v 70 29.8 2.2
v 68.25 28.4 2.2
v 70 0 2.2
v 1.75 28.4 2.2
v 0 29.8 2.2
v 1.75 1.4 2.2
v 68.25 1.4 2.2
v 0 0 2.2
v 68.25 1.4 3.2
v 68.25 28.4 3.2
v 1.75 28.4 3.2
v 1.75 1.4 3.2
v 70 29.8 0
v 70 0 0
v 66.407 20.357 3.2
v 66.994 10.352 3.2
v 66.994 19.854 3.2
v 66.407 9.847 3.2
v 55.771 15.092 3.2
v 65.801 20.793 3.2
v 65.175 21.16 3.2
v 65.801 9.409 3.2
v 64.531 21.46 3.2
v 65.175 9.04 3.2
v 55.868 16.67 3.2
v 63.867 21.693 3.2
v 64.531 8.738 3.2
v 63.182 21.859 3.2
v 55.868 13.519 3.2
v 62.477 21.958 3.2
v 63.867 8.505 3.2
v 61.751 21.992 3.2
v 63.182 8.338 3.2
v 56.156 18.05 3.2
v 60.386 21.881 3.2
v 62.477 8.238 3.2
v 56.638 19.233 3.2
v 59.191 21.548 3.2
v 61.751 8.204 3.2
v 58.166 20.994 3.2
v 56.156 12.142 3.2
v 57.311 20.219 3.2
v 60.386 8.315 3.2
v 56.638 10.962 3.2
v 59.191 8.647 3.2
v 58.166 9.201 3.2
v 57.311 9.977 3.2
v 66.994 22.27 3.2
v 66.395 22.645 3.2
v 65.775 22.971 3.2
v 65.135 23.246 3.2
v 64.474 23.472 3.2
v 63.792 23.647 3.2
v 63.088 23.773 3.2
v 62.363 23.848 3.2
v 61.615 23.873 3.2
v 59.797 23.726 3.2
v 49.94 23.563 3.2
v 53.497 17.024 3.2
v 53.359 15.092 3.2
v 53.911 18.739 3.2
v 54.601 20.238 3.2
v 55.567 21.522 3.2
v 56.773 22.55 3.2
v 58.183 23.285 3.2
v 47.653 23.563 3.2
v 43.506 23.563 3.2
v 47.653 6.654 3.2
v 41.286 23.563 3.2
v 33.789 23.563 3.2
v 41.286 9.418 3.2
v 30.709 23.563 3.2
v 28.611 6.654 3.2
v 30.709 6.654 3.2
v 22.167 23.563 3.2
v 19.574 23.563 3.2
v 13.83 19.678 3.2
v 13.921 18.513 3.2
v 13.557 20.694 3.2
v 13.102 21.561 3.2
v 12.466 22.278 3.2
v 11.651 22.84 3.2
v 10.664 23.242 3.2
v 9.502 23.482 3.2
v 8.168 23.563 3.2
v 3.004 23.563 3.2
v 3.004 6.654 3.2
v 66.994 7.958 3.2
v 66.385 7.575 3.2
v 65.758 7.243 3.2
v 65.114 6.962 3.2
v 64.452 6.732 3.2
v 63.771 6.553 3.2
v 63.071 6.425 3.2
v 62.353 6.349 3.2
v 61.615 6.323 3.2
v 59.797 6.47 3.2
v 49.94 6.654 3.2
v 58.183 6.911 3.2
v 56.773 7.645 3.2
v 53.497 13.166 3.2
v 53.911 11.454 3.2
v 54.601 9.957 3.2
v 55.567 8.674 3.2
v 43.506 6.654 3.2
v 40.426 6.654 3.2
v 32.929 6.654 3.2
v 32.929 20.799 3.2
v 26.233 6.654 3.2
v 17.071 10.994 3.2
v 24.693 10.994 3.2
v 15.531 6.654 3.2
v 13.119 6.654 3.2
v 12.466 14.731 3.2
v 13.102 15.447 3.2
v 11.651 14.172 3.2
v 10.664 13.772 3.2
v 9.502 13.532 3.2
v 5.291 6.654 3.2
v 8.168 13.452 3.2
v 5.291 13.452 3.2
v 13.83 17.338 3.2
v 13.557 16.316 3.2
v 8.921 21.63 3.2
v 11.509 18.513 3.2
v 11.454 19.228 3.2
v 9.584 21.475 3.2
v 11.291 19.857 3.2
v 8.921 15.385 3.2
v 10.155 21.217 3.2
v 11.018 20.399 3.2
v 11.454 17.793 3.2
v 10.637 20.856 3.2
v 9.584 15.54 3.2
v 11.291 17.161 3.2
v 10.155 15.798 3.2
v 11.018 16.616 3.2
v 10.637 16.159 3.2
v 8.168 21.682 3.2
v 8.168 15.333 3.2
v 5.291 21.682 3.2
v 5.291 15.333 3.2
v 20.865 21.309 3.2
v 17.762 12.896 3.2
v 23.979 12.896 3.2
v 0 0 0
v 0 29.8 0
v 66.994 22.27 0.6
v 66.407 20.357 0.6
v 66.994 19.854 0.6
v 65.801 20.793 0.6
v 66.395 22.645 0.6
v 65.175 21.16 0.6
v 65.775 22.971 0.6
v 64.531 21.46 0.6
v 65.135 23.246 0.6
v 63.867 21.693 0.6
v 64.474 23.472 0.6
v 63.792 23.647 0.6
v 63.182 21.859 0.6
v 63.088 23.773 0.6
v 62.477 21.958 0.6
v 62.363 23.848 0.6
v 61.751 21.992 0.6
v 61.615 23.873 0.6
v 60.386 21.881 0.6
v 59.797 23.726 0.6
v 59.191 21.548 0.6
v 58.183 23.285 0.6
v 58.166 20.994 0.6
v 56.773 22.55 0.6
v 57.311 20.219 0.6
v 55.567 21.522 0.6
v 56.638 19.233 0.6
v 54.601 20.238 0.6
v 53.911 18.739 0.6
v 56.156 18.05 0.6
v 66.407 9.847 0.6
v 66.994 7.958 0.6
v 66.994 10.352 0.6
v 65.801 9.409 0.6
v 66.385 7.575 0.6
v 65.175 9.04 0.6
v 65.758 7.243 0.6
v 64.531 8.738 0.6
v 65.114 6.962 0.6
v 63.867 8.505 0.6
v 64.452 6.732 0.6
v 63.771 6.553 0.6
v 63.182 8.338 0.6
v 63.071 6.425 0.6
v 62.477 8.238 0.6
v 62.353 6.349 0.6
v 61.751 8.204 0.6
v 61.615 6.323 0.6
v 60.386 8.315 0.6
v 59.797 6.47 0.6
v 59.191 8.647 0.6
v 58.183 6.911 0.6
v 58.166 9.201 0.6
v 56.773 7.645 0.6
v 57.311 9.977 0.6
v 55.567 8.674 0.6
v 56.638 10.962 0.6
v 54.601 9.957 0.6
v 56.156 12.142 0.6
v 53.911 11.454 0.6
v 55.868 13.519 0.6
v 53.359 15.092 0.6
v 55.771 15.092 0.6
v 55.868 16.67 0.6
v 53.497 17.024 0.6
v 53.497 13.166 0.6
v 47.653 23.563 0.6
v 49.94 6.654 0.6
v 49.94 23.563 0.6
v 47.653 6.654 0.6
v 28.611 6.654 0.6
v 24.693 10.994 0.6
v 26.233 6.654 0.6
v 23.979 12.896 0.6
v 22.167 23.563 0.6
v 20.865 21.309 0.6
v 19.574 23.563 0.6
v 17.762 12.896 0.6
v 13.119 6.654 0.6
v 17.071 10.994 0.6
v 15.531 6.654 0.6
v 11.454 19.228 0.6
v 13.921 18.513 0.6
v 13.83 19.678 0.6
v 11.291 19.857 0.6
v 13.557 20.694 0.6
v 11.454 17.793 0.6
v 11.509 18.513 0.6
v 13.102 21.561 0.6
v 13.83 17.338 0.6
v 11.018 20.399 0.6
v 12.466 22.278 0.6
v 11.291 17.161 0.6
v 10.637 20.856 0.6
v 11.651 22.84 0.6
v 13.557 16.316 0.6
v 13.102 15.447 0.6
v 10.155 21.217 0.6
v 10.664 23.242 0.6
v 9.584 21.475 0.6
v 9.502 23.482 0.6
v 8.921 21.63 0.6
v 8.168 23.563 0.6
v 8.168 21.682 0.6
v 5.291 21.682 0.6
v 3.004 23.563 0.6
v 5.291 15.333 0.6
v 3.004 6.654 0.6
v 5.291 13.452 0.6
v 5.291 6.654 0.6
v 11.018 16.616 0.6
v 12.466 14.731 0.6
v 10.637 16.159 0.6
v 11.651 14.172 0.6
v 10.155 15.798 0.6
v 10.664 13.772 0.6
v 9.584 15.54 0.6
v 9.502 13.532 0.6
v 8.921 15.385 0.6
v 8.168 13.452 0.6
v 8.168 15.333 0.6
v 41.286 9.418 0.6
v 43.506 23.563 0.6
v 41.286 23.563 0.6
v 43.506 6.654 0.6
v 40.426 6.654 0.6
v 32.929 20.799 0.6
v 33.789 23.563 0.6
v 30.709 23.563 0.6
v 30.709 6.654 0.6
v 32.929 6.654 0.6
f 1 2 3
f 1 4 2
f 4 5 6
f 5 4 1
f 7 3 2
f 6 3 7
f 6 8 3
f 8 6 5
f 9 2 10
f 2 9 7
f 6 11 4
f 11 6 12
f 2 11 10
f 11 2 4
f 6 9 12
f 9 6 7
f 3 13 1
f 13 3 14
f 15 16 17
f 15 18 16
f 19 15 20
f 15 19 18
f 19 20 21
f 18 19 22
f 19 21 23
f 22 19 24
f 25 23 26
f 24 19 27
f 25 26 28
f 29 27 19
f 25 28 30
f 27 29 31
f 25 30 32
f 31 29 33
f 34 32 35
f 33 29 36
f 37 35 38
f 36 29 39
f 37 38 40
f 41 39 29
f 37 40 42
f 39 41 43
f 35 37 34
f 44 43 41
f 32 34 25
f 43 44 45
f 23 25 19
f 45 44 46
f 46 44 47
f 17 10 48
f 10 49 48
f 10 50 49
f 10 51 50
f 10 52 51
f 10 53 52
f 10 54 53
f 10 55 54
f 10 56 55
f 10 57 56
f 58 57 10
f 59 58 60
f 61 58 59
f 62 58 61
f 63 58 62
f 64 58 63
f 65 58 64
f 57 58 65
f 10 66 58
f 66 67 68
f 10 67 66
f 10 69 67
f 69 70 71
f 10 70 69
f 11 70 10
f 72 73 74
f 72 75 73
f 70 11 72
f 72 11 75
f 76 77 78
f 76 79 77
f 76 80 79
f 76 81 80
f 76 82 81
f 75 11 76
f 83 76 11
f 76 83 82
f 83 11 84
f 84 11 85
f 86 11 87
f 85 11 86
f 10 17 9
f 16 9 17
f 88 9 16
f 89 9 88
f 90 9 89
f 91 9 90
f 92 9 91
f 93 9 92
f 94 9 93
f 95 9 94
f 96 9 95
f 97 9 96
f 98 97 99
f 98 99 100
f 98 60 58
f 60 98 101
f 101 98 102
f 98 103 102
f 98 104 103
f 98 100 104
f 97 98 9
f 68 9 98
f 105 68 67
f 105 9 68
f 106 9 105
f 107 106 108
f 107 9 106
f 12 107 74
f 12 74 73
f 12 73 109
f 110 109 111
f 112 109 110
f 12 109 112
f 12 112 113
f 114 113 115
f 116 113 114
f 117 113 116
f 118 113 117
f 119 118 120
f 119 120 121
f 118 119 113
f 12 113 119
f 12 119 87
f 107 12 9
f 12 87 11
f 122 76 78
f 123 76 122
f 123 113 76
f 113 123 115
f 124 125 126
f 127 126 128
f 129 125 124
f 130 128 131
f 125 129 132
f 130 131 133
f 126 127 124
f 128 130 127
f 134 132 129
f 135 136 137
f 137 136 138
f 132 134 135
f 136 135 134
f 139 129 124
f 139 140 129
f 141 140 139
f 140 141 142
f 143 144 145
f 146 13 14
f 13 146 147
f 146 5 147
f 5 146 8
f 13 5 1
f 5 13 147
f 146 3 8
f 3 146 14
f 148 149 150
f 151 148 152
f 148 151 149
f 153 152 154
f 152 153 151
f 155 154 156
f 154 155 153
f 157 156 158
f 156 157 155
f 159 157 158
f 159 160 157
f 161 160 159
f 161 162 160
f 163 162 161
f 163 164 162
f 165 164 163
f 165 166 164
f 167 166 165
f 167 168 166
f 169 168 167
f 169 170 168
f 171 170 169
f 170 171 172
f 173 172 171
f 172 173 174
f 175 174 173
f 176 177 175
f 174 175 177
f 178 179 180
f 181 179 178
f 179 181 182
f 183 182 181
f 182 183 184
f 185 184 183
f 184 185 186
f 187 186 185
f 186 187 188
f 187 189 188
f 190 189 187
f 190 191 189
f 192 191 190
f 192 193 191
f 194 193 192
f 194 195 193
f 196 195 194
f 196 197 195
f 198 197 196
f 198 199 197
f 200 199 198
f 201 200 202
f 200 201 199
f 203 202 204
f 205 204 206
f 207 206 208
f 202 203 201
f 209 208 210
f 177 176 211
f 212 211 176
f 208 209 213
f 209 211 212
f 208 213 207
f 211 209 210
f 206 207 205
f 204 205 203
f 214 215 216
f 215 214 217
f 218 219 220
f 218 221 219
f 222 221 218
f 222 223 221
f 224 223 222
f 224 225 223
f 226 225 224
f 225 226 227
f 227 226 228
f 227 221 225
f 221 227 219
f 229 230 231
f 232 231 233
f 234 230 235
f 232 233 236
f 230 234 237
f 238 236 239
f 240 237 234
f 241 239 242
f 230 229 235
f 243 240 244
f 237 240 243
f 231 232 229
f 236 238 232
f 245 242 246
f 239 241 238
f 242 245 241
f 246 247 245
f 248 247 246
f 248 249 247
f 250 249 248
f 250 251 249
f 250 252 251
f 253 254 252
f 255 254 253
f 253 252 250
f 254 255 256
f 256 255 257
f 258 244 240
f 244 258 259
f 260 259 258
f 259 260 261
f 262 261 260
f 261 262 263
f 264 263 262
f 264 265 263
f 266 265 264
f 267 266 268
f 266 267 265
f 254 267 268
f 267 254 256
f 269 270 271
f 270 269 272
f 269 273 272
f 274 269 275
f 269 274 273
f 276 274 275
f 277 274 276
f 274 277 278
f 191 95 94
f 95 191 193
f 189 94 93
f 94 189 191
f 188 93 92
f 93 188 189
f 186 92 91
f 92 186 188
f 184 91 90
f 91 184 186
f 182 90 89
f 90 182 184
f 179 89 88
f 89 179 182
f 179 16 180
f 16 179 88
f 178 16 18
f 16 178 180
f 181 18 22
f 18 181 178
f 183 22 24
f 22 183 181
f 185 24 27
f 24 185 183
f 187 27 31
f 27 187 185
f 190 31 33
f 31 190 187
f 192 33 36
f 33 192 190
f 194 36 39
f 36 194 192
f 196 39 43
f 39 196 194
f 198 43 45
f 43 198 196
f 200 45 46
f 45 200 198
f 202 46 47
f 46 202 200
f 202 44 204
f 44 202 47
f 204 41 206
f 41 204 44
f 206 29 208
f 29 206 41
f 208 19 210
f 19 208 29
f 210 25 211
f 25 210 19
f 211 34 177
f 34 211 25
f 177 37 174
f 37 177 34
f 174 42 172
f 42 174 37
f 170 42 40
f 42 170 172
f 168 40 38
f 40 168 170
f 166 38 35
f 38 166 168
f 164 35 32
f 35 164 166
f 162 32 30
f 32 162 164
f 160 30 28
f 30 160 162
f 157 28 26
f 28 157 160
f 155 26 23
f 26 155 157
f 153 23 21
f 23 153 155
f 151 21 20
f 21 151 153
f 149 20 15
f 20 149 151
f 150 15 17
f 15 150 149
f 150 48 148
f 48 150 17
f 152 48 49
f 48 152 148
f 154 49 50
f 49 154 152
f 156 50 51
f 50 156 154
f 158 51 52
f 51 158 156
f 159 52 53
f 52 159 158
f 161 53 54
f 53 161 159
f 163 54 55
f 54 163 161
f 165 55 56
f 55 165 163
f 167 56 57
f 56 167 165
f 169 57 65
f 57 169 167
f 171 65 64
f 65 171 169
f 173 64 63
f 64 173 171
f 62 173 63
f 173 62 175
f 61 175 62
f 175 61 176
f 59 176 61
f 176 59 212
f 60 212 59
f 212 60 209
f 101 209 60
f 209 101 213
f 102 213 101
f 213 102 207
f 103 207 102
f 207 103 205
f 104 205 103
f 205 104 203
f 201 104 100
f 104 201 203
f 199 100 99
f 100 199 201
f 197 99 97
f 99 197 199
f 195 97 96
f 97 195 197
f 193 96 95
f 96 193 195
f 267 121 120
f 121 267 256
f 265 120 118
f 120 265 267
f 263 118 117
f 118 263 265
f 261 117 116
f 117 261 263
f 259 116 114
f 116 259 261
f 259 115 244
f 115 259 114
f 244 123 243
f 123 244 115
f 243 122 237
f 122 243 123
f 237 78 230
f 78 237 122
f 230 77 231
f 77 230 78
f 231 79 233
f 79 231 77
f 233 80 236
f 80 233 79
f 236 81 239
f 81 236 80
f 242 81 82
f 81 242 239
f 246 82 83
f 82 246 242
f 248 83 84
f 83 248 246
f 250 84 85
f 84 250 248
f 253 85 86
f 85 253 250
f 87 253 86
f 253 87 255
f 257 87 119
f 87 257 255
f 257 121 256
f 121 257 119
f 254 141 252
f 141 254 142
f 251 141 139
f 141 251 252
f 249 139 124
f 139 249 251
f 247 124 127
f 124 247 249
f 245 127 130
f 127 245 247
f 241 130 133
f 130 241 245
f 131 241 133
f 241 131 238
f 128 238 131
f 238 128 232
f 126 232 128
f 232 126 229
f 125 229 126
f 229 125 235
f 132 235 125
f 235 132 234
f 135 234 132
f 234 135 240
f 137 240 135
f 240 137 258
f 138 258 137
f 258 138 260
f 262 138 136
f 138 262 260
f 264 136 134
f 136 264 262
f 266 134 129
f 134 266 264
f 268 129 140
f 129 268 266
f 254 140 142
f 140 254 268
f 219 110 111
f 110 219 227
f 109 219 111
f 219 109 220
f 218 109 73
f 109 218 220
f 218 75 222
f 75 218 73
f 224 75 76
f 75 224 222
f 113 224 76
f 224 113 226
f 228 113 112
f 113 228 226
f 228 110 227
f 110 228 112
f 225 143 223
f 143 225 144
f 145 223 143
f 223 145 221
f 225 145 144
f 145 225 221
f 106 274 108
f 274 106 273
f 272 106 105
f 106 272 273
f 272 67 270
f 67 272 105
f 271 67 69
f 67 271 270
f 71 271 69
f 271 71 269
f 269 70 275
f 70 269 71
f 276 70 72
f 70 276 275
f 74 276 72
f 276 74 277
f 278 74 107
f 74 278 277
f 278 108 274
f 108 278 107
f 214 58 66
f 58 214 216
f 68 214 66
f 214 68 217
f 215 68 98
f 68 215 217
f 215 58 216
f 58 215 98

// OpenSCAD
// PANIC BUTTON LITHOPHANE CUSTOMIZATION PARAMETERS
PANIC_TEXT = "PANIC";
FONT = "DIN Alternate";
FONT_SIZE = 16.7;
MINIMUM_THICKNESS = 0.6;
CENTER_TWEAK = -0.7;     // added to text x-pos to make it look better centered

// CONSTANTS (tune to your printer if necessary)
_WIDTH = 70;
_HEIGHT = 29.8;
_TOTAL_DEPTH = 3.2;
_WINDOW_WIDTH = 66.5;
_WINDOW_HEIGHT = 27;
_FRAME_CUT_DEPTH = 1;


difference() {
    difference() {
        color("white", 1.0) cube([_WIDTH, _HEIGHT, _TOTAL_DEPTH]);

        // frame represents the outer (frontmost) edges of the window on the panic button shell
        color("red", 0.75) translate([0, 0, _TOTAL_DEPTH-1]) {
            difference() {
                // cube that will become the frame
                translate([-0.05, -0.05, 0]) {
                    cube([_WIDTH+0.1, _HEIGHT+0.1, _FRAME_CUT_DEPTH+0.1]);
                }
                
                // cube that represents the portion of the lithophane that
                // will sit flush with the front of the panic button
                translate([(_WIDTH - _WINDOW_WIDTH)/2, (_HEIGHT - _WINDOW_HEIGHT)/2, -0.1]) {
                    cube([_WINDOW_WIDTH, _WINDOW_HEIGHT, _FRAME_CUT_DEPTH+0.2]);
                }
            }
        }
    }

    // subtract the text
    color("lightgray", 1.0) translate([_WIDTH/2+CENTER_TWEAK, _HEIGHT/2, MINIMUM_THICKNESS]) {
        linear_extrude(height=(_TOTAL_DEPTH - MINIMUM_THICKNESS + 0.1)) {
            text(PANIC_TEXT, size=FONT_SIZE, font=FONT, halign="center", valign="center");
        }
    }
}
